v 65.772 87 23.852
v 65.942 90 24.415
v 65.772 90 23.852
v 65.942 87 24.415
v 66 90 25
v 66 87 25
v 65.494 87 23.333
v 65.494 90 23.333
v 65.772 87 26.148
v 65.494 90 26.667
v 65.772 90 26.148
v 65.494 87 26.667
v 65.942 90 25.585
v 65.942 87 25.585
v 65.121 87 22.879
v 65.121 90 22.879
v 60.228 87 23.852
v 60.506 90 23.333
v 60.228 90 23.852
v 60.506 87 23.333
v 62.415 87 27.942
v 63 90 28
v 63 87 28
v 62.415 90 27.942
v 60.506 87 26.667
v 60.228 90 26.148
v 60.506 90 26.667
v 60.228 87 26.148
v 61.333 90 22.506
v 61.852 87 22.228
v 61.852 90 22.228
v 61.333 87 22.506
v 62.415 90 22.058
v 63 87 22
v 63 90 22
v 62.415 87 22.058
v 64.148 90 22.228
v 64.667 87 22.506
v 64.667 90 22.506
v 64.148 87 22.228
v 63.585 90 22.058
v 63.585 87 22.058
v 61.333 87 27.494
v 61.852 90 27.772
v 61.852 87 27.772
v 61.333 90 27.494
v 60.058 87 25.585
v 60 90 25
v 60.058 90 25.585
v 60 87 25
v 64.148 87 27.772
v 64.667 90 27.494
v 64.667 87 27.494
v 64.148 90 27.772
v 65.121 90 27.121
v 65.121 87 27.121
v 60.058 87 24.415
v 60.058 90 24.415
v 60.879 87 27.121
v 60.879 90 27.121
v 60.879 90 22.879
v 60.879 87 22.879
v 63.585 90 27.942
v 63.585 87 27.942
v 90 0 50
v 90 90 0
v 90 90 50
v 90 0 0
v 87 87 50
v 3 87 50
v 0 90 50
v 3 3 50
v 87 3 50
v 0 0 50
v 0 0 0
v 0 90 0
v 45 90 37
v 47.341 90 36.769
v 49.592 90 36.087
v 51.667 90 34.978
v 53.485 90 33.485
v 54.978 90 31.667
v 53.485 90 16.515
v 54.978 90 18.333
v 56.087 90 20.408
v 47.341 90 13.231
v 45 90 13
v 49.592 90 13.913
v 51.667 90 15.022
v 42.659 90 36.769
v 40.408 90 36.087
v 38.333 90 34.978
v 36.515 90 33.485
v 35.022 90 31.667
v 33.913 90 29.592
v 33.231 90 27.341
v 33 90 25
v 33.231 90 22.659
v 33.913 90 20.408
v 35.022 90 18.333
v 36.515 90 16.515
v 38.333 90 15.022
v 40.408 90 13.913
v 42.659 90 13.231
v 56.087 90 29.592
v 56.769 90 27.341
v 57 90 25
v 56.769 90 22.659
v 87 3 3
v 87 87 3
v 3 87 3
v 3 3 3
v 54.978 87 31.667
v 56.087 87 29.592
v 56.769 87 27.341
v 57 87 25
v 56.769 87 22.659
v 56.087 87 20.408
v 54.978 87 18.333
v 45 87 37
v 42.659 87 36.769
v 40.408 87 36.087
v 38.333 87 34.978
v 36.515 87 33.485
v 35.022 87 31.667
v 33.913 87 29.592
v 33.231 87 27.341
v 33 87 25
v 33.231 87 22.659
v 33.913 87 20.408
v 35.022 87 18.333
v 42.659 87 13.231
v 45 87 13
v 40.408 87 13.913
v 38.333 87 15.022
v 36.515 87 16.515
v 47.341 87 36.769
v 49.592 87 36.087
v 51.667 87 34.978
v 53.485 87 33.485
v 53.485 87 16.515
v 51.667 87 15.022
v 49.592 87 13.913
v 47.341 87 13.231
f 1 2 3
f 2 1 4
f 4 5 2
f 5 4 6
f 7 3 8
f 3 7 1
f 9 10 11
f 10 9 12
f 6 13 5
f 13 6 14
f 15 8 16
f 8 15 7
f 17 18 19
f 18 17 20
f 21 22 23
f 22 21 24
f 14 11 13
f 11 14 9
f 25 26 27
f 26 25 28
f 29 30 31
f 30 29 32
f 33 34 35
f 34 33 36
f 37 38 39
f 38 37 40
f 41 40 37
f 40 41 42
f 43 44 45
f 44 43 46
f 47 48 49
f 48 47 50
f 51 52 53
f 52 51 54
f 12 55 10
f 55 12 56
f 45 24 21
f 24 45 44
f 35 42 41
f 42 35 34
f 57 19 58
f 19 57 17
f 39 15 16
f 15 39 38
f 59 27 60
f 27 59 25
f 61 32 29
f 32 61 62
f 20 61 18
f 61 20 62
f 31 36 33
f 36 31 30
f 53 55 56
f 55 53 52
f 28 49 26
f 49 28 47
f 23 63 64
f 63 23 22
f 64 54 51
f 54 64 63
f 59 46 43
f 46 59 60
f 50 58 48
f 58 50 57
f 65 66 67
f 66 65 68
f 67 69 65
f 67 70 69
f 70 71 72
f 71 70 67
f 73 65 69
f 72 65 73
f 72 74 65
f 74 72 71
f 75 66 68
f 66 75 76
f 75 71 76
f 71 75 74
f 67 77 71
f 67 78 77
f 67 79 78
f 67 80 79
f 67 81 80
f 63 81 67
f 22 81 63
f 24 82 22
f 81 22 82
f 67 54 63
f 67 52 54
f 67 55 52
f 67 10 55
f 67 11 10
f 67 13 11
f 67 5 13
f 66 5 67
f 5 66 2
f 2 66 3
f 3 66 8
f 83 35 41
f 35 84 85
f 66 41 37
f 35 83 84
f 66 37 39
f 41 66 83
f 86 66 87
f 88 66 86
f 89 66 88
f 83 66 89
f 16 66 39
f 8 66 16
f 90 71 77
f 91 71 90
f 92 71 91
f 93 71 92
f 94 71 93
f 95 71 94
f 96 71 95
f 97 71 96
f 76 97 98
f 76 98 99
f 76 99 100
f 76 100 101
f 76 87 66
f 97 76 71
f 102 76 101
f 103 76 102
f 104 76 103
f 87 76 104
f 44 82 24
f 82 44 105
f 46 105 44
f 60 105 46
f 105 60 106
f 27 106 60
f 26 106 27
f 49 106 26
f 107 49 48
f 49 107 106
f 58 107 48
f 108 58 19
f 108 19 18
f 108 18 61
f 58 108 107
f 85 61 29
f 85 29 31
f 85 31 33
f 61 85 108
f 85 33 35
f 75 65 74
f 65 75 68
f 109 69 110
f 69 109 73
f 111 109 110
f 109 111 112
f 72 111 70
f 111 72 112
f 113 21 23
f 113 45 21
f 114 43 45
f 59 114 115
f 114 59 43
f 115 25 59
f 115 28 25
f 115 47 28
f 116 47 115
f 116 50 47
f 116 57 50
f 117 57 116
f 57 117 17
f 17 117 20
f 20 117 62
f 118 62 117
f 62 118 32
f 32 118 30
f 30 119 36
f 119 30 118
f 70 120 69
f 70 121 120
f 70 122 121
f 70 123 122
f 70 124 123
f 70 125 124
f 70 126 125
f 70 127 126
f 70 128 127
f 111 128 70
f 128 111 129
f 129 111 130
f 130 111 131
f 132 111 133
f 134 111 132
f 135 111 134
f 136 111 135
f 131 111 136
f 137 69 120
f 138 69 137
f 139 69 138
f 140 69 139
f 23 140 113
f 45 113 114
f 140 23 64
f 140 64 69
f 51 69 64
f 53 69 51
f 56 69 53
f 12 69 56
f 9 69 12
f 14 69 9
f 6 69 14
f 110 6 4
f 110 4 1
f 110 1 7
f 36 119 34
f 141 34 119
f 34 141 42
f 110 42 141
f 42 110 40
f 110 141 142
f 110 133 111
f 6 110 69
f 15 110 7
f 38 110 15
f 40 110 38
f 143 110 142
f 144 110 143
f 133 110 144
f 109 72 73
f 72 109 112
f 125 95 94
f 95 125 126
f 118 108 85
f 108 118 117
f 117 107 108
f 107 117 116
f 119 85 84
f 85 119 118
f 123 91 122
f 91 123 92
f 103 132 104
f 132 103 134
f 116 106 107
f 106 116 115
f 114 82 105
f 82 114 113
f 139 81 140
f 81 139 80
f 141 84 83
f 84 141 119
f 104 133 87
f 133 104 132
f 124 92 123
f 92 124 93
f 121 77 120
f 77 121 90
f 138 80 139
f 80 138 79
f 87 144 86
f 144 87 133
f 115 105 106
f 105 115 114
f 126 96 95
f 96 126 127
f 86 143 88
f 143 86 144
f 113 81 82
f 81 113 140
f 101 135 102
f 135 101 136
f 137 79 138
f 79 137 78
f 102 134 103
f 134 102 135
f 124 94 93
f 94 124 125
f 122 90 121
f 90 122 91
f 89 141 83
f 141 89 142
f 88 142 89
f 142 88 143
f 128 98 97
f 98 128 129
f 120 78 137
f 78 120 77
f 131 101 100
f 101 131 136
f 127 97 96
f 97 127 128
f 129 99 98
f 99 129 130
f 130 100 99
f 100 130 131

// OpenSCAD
$fn = 32;

// ----------------------------------------------------------------------
// Vent box: roundvent enclosure
// ----------------------------------------------------------------------

// --- parameters (mm) ---
box_l = 90;               // box length, X
box_w = 90;               // box width, Y
box_h = 50;               // box height, Z
wall_t = 3;               // shell wall thickness
vent_d = 24;              // central vent diameter
ring_d = 6;               // ring hole diameter
n_ring = 6;               // holes in the ring
ring_r = 18;              // ring radius
fit_tol = 0.02;           // tolerance for press fits, mm
free_tol = 0.2;           // tolerance for clearance fits, mm

ring_step = 360 / n_ring;  // ring hole angular step

difference() {
  cube([box_l, box_w, box_h]);
  translate([wall_t, wall_t, wall_t])
    cube([box_l - 2 * wall_t, box_w - 2 * wall_t, box_h]);
  translate([box_l / 2, box_w - wall_t - 1, box_h / 2])
    rotate([-90, 0, 0]) cylinder(h = wall_t + 2, d = vent_d);
  for (i = [0 : n_ring - 1])
    translate([box_l / 2, box_w - wall_t - 1, box_h / 2])
      rotate([0, 0, i * ring_step])
        translate([ring_r, 0, 0]) rotate([-90, 0, 0])
          cylinder(h = wall_t + 2, d = ring_d);
}
